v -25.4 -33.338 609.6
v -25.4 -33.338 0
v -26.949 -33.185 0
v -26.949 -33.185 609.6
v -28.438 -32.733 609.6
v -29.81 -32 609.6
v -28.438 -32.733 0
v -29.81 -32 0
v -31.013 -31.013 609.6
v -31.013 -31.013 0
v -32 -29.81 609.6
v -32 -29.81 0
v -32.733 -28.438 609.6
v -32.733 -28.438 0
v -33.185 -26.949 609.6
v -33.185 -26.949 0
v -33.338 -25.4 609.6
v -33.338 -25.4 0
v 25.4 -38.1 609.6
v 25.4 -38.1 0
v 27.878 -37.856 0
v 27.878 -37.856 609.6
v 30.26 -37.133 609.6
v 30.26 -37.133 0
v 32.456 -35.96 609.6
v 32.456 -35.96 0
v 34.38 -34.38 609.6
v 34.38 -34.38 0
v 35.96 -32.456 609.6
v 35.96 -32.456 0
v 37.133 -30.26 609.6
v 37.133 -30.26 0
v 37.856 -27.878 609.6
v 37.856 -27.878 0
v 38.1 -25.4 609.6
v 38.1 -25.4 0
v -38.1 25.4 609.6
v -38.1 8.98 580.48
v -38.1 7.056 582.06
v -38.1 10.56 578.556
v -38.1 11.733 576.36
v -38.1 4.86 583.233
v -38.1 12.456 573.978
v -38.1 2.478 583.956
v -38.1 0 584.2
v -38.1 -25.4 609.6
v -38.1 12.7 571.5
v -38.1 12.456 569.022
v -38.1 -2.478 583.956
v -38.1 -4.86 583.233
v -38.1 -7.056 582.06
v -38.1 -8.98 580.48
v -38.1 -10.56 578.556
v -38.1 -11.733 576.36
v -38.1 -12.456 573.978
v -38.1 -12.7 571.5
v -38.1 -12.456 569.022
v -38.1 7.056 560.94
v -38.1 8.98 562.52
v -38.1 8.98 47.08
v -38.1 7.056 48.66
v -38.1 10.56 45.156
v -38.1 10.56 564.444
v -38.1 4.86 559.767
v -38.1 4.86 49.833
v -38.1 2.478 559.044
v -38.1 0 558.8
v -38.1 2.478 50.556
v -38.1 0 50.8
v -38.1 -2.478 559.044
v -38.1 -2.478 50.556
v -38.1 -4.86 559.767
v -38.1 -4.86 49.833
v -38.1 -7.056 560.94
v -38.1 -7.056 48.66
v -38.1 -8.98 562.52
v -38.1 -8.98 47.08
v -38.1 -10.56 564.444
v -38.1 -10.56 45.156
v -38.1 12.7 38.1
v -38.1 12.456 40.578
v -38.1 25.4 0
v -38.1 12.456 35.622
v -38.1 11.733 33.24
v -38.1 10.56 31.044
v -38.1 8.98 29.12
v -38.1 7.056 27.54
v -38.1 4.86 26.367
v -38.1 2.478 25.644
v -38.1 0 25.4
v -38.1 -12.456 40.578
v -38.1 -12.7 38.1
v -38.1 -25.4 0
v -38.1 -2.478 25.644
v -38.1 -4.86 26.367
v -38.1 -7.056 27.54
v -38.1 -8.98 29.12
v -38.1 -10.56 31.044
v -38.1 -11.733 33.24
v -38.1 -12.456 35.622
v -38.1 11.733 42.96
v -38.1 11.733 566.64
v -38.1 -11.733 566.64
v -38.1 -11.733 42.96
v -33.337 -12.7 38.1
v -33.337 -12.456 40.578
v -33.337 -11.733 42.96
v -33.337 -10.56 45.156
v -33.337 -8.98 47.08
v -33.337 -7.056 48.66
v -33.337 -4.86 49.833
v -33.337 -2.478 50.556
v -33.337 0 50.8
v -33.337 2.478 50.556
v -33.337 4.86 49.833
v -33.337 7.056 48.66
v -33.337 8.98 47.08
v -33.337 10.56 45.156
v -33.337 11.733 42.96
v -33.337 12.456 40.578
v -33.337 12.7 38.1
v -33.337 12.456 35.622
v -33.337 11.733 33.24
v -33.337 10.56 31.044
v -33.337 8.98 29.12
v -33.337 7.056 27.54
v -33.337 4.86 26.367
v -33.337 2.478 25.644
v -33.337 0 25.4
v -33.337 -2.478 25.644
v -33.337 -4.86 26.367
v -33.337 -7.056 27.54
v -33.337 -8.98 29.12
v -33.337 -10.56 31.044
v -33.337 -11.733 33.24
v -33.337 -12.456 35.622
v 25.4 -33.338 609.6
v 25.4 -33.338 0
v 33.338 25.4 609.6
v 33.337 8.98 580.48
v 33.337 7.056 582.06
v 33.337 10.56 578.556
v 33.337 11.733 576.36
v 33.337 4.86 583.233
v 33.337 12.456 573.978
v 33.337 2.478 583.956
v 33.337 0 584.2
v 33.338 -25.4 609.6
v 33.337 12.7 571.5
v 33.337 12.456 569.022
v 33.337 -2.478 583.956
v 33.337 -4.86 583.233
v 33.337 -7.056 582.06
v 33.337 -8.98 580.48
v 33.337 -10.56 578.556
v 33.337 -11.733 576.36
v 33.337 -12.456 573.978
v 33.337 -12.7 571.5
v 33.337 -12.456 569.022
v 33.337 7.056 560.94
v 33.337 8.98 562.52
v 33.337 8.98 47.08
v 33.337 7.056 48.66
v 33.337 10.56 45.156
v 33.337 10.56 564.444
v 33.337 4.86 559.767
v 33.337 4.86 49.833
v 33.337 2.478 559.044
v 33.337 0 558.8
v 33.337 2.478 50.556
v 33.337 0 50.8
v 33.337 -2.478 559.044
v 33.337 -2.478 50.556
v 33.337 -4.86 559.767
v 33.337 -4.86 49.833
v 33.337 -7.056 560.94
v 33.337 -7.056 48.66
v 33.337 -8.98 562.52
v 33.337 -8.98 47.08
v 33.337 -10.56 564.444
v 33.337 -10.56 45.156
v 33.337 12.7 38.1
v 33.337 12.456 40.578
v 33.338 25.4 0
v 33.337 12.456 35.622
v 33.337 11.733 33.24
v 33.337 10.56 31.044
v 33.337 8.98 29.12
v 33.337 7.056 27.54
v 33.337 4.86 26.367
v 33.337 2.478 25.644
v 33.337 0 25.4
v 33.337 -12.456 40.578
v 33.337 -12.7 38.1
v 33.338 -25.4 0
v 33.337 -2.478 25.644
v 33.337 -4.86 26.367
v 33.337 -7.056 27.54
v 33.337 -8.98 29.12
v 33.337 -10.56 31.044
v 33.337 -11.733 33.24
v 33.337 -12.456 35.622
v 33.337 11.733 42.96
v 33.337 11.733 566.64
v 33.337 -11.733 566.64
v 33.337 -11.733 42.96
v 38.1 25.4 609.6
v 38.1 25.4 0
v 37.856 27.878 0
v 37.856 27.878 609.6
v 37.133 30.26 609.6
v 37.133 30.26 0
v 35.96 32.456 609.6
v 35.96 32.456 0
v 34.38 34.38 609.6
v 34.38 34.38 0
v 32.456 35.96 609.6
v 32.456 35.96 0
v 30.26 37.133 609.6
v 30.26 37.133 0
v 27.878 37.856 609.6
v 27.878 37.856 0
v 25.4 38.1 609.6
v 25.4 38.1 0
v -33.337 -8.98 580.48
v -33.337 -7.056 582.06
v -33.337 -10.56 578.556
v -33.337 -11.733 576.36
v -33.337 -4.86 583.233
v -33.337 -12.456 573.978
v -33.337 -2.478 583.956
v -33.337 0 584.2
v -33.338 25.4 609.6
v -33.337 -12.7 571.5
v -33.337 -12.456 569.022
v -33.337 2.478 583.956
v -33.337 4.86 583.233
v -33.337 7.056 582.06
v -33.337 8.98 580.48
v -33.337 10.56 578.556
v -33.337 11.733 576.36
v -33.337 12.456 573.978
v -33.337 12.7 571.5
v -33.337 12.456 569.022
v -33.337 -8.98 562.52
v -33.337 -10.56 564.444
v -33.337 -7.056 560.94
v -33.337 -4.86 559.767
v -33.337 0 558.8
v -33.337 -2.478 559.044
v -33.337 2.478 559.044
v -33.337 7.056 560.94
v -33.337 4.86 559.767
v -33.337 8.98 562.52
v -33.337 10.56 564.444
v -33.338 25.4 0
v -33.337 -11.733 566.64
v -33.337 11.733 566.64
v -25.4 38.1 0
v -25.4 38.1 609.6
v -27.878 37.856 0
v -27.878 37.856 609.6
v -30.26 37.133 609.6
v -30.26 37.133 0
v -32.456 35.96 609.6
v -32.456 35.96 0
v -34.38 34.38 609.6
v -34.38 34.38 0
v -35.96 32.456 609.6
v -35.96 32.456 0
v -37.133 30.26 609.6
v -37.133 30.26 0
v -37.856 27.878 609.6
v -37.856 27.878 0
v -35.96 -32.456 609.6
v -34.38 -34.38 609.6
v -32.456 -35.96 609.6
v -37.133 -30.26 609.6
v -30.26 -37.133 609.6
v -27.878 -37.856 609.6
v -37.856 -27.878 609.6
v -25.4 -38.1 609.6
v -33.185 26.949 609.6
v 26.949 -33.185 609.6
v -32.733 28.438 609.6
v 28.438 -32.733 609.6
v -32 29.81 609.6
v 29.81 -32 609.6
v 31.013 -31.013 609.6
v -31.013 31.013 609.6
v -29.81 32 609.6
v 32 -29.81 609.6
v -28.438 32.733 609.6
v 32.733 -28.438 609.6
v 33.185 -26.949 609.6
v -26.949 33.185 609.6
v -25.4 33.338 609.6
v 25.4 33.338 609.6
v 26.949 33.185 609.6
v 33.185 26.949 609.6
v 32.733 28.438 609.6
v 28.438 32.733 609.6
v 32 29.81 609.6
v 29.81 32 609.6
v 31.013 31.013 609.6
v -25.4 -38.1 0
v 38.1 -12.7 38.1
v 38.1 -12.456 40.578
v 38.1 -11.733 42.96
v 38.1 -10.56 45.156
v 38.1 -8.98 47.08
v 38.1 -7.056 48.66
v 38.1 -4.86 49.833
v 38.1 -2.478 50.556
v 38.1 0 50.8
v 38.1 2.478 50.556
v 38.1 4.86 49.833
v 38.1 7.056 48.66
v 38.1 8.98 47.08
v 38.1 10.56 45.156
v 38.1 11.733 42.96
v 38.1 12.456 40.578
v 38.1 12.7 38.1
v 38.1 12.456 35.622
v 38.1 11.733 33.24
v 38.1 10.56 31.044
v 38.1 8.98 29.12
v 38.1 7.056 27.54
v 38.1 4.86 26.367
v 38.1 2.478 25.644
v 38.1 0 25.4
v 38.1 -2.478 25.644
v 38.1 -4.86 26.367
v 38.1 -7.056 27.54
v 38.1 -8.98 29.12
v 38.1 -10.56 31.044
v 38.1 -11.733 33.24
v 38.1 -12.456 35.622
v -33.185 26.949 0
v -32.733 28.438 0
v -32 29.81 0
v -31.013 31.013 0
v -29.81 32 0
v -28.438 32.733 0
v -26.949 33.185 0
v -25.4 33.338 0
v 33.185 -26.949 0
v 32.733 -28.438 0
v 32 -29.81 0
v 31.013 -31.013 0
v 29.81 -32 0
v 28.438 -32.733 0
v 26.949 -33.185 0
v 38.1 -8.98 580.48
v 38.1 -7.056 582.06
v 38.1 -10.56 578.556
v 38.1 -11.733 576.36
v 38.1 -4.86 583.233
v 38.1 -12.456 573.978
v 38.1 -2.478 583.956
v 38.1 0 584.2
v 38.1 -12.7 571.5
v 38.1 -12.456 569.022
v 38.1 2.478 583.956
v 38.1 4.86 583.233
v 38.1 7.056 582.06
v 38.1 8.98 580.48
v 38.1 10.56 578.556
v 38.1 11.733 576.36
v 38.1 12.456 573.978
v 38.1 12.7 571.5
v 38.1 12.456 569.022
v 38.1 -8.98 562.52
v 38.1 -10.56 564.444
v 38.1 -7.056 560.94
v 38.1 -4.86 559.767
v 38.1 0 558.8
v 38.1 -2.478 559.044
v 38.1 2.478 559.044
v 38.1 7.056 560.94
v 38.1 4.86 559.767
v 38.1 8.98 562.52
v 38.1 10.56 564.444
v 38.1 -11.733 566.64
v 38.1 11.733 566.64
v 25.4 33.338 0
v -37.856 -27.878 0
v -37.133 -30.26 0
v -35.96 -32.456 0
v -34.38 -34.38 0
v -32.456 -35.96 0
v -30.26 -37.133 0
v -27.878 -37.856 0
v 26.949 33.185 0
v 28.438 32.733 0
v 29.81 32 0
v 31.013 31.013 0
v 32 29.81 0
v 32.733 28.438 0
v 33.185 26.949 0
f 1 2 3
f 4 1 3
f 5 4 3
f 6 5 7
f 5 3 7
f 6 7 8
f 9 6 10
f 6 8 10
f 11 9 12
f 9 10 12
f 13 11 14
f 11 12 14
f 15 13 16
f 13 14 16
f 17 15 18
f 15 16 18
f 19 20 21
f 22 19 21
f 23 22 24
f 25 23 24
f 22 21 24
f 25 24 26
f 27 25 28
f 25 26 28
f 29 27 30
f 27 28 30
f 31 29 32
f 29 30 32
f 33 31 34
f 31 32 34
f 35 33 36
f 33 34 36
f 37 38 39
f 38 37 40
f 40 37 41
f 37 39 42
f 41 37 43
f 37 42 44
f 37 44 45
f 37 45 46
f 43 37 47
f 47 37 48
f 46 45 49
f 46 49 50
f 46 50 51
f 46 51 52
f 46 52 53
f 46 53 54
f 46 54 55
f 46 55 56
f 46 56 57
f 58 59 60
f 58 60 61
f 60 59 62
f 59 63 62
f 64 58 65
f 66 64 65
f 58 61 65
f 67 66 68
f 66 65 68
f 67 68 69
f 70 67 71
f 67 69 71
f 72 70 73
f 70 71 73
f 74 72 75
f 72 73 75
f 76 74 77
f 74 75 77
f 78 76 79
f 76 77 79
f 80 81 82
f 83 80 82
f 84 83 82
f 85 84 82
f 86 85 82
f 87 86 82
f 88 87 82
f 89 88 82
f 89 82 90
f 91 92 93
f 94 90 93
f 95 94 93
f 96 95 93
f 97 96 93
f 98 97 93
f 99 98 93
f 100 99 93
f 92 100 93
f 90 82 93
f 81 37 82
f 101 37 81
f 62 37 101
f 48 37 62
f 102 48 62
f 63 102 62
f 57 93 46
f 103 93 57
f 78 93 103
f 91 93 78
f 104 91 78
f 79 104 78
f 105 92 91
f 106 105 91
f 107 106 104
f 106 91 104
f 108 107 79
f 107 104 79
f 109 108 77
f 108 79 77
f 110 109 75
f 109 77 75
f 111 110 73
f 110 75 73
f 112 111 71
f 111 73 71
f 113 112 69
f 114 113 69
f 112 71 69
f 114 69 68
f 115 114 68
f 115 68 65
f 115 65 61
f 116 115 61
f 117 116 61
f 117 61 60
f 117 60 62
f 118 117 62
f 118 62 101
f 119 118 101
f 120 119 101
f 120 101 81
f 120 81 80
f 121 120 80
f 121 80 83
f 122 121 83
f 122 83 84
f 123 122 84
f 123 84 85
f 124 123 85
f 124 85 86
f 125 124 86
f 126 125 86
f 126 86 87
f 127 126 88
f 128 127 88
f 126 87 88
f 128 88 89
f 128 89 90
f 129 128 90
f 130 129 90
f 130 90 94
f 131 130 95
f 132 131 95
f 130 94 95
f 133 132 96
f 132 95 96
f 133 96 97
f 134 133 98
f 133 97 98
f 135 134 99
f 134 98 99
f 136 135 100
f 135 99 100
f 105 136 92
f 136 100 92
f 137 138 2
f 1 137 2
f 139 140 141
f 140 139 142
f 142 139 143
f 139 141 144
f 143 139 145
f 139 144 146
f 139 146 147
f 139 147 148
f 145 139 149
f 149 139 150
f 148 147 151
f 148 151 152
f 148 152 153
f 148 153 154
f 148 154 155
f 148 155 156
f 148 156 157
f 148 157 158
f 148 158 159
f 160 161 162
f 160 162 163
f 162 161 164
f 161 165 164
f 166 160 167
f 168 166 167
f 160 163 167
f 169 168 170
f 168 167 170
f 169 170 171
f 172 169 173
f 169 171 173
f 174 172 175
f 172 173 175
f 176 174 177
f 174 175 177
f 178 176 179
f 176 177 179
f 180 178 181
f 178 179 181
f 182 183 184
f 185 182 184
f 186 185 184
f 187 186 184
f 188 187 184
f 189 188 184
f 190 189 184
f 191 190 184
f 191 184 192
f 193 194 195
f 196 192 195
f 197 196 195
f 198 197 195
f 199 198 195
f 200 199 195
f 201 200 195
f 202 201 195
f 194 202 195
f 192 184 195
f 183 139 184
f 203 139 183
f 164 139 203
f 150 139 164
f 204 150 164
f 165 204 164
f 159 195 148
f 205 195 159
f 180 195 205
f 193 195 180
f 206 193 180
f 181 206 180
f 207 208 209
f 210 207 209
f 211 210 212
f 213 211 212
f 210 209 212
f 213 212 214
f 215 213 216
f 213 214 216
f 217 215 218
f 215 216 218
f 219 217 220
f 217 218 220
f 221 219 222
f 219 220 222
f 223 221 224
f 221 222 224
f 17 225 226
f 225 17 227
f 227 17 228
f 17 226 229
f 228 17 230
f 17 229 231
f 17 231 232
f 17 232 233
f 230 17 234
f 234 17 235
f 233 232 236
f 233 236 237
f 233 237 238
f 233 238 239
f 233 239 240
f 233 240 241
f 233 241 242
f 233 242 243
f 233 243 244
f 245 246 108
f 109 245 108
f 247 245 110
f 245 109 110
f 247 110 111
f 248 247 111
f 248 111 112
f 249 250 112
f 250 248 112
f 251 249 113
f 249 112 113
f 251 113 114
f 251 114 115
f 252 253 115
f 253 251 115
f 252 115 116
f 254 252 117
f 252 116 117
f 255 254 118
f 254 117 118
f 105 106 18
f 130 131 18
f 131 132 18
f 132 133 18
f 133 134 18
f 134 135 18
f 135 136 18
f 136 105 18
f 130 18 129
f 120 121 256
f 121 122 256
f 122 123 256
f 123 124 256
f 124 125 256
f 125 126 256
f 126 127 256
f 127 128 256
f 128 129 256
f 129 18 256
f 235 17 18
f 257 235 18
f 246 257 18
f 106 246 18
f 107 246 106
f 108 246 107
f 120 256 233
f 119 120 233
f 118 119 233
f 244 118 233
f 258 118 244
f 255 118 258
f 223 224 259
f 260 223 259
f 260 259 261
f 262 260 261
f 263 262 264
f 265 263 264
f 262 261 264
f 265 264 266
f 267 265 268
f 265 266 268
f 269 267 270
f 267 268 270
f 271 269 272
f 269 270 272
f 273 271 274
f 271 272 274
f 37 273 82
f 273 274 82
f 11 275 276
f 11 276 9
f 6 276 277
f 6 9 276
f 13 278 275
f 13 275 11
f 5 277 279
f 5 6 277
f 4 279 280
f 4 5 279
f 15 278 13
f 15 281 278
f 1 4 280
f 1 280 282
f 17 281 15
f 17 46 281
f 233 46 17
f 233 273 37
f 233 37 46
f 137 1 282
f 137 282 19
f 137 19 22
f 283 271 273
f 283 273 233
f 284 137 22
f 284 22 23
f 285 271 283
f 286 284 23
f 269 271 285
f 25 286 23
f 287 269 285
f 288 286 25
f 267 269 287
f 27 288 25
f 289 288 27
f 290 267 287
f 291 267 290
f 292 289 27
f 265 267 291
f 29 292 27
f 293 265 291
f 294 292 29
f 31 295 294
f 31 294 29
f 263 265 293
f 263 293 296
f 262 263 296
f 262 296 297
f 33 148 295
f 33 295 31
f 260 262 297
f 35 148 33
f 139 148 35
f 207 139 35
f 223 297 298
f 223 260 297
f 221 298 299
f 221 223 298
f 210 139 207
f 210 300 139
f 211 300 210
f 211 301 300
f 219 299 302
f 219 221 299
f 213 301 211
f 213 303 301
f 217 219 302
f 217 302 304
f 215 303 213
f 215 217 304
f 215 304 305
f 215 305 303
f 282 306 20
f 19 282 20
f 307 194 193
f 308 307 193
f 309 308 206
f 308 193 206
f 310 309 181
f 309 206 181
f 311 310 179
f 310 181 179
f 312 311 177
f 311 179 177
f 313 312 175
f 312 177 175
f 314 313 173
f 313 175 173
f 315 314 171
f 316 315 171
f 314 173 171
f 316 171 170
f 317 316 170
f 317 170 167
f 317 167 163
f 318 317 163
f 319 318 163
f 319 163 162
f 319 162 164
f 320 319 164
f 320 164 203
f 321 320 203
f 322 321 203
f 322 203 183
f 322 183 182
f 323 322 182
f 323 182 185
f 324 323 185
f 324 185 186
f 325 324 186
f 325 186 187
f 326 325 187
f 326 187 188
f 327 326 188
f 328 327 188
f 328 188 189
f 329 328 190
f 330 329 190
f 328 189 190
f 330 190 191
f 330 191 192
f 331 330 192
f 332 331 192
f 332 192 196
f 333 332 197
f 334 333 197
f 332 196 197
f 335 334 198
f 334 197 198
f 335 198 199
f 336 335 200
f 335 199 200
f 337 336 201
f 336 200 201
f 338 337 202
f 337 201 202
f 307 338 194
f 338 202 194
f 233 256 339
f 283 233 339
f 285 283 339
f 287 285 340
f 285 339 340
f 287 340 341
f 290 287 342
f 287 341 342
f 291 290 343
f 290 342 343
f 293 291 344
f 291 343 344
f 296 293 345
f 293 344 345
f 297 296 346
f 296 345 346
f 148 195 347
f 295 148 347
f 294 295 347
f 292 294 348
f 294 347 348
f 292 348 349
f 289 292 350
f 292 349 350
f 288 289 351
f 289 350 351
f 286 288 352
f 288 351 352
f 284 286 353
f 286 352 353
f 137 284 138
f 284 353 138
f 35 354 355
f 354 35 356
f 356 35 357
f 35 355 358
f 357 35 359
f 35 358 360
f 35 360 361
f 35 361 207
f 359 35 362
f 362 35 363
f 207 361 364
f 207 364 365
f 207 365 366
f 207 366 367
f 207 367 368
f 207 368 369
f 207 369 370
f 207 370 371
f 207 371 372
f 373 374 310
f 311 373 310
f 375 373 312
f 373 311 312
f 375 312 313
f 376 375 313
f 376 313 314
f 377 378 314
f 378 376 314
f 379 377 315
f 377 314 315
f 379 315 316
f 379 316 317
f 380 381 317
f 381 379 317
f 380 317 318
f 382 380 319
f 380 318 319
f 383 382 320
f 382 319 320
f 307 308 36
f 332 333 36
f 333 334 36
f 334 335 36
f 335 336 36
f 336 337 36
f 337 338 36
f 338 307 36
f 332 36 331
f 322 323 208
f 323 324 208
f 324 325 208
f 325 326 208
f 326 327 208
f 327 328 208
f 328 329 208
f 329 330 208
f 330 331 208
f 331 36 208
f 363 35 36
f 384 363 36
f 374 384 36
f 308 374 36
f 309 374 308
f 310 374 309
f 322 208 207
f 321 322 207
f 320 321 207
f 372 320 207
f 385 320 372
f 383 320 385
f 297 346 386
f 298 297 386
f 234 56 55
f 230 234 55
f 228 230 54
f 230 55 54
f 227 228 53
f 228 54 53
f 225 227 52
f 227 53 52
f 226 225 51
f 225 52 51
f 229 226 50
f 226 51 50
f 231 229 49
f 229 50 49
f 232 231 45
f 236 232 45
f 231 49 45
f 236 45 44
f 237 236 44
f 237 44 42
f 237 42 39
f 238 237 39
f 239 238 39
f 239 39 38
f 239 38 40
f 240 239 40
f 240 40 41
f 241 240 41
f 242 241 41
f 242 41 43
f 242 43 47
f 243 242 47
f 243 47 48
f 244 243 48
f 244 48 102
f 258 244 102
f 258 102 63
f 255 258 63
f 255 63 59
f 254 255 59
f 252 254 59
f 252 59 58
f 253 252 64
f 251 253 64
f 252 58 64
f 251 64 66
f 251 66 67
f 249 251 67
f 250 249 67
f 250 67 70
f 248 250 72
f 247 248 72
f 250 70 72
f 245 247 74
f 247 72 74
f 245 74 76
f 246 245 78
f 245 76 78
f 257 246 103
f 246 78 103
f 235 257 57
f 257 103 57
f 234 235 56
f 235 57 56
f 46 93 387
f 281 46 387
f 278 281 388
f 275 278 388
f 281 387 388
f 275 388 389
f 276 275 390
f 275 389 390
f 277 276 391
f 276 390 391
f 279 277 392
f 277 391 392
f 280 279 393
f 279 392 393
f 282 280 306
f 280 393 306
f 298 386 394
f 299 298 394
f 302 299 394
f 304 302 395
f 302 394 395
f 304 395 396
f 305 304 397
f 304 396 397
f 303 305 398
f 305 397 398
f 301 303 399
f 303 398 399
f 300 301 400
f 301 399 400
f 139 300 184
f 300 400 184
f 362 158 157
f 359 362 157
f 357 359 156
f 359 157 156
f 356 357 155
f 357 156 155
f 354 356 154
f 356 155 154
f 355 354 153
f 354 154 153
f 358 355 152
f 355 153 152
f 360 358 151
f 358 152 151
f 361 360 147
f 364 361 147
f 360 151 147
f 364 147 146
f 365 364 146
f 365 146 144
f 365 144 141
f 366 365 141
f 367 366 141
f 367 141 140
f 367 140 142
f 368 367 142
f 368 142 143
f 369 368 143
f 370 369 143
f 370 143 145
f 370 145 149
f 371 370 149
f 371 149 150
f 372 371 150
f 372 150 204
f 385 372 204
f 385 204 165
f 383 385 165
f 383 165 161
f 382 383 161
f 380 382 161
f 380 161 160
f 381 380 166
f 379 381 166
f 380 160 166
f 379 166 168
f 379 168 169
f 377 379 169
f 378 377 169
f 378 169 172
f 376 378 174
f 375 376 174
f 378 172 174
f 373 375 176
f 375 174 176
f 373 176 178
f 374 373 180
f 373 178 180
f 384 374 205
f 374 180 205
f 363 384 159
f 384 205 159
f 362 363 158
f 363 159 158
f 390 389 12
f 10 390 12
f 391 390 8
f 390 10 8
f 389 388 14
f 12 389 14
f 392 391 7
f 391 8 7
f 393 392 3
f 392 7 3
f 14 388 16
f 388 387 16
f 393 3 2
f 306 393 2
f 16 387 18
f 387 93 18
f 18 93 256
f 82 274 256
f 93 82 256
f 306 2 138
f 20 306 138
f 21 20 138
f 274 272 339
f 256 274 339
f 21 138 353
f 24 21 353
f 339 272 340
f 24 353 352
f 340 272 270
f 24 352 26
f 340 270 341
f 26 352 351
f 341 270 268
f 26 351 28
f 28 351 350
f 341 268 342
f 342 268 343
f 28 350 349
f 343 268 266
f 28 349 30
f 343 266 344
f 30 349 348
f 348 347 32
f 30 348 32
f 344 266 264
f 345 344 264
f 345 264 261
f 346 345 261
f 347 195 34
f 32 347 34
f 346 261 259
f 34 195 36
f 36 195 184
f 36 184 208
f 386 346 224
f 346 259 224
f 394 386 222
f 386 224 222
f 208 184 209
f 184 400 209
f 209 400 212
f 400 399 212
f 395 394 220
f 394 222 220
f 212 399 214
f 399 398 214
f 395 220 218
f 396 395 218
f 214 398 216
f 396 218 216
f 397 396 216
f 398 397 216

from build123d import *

# Parameters (mm, degrees)
F1_DEPTH = 609.6
F3_D     = 25.4


with BuildPart() as f1:
    # F0 (on Top) → F1 (new body)
    with BuildSketch(Plane.XY):
        with BuildLine():
            ThreePointArc((38.1, 25.4), (34.380256, 34.380256), (25.4, 38.1))
            Line((25.4, 38.1), (-25.4, 38.1))
            ThreePointArc((-25.4, 38.1), (-34.380256, 34.380256), (-38.1, 25.4))
            Line((-38.1, 25.4), (-38.1, -25.4))
            ThreePointArc((-38.1, -25.4), (-34.380256, -34.380256), (-25.4, -38.1))
            Line((-25.4, -38.1), (25.4, -38.1))
            ThreePointArc((25.4, -38.1), (34.380256, -34.380256), (38.1, -25.4))
            Line((38.1, -25.4), (38.1, 25.4))
        make_face()
        with BuildLine():
            ThreePointArc((25.4, 33.3375), (31.01266, 31.01266), (33.3375, 25.4))
            Line((33.3375, 25.4), (33.3375, -25.4))
            ThreePointArc((33.3375, -25.4), (31.01266, -31.01266), (25.4, -33.3375))
            Line((25.4, -33.3375), (-25.4, -33.3375))
            ThreePointArc((-25.4, -33.3375), (-31.01266, -31.01266), (-33.3375, -25.4))
            Line((-33.3375, -25.4), (-33.3375, 25.4))
            ThreePointArc((-33.3375, 25.4), (-31.01266, 31.01266), (-25.4, 33.3375))
            Line((-25.4, 33.3375), (25.4, 33.3375))
        make_face(mode=Mode.SUBTRACT)
    extrude(amount=F1_DEPTH)

    # F3 (through all)
    with Locations(Plane.YZ.offset(38.1)):
        with Locations((0, 571.5), (0, 38.1)):
            Hole(F3_D / 2)


solid = f1.part
